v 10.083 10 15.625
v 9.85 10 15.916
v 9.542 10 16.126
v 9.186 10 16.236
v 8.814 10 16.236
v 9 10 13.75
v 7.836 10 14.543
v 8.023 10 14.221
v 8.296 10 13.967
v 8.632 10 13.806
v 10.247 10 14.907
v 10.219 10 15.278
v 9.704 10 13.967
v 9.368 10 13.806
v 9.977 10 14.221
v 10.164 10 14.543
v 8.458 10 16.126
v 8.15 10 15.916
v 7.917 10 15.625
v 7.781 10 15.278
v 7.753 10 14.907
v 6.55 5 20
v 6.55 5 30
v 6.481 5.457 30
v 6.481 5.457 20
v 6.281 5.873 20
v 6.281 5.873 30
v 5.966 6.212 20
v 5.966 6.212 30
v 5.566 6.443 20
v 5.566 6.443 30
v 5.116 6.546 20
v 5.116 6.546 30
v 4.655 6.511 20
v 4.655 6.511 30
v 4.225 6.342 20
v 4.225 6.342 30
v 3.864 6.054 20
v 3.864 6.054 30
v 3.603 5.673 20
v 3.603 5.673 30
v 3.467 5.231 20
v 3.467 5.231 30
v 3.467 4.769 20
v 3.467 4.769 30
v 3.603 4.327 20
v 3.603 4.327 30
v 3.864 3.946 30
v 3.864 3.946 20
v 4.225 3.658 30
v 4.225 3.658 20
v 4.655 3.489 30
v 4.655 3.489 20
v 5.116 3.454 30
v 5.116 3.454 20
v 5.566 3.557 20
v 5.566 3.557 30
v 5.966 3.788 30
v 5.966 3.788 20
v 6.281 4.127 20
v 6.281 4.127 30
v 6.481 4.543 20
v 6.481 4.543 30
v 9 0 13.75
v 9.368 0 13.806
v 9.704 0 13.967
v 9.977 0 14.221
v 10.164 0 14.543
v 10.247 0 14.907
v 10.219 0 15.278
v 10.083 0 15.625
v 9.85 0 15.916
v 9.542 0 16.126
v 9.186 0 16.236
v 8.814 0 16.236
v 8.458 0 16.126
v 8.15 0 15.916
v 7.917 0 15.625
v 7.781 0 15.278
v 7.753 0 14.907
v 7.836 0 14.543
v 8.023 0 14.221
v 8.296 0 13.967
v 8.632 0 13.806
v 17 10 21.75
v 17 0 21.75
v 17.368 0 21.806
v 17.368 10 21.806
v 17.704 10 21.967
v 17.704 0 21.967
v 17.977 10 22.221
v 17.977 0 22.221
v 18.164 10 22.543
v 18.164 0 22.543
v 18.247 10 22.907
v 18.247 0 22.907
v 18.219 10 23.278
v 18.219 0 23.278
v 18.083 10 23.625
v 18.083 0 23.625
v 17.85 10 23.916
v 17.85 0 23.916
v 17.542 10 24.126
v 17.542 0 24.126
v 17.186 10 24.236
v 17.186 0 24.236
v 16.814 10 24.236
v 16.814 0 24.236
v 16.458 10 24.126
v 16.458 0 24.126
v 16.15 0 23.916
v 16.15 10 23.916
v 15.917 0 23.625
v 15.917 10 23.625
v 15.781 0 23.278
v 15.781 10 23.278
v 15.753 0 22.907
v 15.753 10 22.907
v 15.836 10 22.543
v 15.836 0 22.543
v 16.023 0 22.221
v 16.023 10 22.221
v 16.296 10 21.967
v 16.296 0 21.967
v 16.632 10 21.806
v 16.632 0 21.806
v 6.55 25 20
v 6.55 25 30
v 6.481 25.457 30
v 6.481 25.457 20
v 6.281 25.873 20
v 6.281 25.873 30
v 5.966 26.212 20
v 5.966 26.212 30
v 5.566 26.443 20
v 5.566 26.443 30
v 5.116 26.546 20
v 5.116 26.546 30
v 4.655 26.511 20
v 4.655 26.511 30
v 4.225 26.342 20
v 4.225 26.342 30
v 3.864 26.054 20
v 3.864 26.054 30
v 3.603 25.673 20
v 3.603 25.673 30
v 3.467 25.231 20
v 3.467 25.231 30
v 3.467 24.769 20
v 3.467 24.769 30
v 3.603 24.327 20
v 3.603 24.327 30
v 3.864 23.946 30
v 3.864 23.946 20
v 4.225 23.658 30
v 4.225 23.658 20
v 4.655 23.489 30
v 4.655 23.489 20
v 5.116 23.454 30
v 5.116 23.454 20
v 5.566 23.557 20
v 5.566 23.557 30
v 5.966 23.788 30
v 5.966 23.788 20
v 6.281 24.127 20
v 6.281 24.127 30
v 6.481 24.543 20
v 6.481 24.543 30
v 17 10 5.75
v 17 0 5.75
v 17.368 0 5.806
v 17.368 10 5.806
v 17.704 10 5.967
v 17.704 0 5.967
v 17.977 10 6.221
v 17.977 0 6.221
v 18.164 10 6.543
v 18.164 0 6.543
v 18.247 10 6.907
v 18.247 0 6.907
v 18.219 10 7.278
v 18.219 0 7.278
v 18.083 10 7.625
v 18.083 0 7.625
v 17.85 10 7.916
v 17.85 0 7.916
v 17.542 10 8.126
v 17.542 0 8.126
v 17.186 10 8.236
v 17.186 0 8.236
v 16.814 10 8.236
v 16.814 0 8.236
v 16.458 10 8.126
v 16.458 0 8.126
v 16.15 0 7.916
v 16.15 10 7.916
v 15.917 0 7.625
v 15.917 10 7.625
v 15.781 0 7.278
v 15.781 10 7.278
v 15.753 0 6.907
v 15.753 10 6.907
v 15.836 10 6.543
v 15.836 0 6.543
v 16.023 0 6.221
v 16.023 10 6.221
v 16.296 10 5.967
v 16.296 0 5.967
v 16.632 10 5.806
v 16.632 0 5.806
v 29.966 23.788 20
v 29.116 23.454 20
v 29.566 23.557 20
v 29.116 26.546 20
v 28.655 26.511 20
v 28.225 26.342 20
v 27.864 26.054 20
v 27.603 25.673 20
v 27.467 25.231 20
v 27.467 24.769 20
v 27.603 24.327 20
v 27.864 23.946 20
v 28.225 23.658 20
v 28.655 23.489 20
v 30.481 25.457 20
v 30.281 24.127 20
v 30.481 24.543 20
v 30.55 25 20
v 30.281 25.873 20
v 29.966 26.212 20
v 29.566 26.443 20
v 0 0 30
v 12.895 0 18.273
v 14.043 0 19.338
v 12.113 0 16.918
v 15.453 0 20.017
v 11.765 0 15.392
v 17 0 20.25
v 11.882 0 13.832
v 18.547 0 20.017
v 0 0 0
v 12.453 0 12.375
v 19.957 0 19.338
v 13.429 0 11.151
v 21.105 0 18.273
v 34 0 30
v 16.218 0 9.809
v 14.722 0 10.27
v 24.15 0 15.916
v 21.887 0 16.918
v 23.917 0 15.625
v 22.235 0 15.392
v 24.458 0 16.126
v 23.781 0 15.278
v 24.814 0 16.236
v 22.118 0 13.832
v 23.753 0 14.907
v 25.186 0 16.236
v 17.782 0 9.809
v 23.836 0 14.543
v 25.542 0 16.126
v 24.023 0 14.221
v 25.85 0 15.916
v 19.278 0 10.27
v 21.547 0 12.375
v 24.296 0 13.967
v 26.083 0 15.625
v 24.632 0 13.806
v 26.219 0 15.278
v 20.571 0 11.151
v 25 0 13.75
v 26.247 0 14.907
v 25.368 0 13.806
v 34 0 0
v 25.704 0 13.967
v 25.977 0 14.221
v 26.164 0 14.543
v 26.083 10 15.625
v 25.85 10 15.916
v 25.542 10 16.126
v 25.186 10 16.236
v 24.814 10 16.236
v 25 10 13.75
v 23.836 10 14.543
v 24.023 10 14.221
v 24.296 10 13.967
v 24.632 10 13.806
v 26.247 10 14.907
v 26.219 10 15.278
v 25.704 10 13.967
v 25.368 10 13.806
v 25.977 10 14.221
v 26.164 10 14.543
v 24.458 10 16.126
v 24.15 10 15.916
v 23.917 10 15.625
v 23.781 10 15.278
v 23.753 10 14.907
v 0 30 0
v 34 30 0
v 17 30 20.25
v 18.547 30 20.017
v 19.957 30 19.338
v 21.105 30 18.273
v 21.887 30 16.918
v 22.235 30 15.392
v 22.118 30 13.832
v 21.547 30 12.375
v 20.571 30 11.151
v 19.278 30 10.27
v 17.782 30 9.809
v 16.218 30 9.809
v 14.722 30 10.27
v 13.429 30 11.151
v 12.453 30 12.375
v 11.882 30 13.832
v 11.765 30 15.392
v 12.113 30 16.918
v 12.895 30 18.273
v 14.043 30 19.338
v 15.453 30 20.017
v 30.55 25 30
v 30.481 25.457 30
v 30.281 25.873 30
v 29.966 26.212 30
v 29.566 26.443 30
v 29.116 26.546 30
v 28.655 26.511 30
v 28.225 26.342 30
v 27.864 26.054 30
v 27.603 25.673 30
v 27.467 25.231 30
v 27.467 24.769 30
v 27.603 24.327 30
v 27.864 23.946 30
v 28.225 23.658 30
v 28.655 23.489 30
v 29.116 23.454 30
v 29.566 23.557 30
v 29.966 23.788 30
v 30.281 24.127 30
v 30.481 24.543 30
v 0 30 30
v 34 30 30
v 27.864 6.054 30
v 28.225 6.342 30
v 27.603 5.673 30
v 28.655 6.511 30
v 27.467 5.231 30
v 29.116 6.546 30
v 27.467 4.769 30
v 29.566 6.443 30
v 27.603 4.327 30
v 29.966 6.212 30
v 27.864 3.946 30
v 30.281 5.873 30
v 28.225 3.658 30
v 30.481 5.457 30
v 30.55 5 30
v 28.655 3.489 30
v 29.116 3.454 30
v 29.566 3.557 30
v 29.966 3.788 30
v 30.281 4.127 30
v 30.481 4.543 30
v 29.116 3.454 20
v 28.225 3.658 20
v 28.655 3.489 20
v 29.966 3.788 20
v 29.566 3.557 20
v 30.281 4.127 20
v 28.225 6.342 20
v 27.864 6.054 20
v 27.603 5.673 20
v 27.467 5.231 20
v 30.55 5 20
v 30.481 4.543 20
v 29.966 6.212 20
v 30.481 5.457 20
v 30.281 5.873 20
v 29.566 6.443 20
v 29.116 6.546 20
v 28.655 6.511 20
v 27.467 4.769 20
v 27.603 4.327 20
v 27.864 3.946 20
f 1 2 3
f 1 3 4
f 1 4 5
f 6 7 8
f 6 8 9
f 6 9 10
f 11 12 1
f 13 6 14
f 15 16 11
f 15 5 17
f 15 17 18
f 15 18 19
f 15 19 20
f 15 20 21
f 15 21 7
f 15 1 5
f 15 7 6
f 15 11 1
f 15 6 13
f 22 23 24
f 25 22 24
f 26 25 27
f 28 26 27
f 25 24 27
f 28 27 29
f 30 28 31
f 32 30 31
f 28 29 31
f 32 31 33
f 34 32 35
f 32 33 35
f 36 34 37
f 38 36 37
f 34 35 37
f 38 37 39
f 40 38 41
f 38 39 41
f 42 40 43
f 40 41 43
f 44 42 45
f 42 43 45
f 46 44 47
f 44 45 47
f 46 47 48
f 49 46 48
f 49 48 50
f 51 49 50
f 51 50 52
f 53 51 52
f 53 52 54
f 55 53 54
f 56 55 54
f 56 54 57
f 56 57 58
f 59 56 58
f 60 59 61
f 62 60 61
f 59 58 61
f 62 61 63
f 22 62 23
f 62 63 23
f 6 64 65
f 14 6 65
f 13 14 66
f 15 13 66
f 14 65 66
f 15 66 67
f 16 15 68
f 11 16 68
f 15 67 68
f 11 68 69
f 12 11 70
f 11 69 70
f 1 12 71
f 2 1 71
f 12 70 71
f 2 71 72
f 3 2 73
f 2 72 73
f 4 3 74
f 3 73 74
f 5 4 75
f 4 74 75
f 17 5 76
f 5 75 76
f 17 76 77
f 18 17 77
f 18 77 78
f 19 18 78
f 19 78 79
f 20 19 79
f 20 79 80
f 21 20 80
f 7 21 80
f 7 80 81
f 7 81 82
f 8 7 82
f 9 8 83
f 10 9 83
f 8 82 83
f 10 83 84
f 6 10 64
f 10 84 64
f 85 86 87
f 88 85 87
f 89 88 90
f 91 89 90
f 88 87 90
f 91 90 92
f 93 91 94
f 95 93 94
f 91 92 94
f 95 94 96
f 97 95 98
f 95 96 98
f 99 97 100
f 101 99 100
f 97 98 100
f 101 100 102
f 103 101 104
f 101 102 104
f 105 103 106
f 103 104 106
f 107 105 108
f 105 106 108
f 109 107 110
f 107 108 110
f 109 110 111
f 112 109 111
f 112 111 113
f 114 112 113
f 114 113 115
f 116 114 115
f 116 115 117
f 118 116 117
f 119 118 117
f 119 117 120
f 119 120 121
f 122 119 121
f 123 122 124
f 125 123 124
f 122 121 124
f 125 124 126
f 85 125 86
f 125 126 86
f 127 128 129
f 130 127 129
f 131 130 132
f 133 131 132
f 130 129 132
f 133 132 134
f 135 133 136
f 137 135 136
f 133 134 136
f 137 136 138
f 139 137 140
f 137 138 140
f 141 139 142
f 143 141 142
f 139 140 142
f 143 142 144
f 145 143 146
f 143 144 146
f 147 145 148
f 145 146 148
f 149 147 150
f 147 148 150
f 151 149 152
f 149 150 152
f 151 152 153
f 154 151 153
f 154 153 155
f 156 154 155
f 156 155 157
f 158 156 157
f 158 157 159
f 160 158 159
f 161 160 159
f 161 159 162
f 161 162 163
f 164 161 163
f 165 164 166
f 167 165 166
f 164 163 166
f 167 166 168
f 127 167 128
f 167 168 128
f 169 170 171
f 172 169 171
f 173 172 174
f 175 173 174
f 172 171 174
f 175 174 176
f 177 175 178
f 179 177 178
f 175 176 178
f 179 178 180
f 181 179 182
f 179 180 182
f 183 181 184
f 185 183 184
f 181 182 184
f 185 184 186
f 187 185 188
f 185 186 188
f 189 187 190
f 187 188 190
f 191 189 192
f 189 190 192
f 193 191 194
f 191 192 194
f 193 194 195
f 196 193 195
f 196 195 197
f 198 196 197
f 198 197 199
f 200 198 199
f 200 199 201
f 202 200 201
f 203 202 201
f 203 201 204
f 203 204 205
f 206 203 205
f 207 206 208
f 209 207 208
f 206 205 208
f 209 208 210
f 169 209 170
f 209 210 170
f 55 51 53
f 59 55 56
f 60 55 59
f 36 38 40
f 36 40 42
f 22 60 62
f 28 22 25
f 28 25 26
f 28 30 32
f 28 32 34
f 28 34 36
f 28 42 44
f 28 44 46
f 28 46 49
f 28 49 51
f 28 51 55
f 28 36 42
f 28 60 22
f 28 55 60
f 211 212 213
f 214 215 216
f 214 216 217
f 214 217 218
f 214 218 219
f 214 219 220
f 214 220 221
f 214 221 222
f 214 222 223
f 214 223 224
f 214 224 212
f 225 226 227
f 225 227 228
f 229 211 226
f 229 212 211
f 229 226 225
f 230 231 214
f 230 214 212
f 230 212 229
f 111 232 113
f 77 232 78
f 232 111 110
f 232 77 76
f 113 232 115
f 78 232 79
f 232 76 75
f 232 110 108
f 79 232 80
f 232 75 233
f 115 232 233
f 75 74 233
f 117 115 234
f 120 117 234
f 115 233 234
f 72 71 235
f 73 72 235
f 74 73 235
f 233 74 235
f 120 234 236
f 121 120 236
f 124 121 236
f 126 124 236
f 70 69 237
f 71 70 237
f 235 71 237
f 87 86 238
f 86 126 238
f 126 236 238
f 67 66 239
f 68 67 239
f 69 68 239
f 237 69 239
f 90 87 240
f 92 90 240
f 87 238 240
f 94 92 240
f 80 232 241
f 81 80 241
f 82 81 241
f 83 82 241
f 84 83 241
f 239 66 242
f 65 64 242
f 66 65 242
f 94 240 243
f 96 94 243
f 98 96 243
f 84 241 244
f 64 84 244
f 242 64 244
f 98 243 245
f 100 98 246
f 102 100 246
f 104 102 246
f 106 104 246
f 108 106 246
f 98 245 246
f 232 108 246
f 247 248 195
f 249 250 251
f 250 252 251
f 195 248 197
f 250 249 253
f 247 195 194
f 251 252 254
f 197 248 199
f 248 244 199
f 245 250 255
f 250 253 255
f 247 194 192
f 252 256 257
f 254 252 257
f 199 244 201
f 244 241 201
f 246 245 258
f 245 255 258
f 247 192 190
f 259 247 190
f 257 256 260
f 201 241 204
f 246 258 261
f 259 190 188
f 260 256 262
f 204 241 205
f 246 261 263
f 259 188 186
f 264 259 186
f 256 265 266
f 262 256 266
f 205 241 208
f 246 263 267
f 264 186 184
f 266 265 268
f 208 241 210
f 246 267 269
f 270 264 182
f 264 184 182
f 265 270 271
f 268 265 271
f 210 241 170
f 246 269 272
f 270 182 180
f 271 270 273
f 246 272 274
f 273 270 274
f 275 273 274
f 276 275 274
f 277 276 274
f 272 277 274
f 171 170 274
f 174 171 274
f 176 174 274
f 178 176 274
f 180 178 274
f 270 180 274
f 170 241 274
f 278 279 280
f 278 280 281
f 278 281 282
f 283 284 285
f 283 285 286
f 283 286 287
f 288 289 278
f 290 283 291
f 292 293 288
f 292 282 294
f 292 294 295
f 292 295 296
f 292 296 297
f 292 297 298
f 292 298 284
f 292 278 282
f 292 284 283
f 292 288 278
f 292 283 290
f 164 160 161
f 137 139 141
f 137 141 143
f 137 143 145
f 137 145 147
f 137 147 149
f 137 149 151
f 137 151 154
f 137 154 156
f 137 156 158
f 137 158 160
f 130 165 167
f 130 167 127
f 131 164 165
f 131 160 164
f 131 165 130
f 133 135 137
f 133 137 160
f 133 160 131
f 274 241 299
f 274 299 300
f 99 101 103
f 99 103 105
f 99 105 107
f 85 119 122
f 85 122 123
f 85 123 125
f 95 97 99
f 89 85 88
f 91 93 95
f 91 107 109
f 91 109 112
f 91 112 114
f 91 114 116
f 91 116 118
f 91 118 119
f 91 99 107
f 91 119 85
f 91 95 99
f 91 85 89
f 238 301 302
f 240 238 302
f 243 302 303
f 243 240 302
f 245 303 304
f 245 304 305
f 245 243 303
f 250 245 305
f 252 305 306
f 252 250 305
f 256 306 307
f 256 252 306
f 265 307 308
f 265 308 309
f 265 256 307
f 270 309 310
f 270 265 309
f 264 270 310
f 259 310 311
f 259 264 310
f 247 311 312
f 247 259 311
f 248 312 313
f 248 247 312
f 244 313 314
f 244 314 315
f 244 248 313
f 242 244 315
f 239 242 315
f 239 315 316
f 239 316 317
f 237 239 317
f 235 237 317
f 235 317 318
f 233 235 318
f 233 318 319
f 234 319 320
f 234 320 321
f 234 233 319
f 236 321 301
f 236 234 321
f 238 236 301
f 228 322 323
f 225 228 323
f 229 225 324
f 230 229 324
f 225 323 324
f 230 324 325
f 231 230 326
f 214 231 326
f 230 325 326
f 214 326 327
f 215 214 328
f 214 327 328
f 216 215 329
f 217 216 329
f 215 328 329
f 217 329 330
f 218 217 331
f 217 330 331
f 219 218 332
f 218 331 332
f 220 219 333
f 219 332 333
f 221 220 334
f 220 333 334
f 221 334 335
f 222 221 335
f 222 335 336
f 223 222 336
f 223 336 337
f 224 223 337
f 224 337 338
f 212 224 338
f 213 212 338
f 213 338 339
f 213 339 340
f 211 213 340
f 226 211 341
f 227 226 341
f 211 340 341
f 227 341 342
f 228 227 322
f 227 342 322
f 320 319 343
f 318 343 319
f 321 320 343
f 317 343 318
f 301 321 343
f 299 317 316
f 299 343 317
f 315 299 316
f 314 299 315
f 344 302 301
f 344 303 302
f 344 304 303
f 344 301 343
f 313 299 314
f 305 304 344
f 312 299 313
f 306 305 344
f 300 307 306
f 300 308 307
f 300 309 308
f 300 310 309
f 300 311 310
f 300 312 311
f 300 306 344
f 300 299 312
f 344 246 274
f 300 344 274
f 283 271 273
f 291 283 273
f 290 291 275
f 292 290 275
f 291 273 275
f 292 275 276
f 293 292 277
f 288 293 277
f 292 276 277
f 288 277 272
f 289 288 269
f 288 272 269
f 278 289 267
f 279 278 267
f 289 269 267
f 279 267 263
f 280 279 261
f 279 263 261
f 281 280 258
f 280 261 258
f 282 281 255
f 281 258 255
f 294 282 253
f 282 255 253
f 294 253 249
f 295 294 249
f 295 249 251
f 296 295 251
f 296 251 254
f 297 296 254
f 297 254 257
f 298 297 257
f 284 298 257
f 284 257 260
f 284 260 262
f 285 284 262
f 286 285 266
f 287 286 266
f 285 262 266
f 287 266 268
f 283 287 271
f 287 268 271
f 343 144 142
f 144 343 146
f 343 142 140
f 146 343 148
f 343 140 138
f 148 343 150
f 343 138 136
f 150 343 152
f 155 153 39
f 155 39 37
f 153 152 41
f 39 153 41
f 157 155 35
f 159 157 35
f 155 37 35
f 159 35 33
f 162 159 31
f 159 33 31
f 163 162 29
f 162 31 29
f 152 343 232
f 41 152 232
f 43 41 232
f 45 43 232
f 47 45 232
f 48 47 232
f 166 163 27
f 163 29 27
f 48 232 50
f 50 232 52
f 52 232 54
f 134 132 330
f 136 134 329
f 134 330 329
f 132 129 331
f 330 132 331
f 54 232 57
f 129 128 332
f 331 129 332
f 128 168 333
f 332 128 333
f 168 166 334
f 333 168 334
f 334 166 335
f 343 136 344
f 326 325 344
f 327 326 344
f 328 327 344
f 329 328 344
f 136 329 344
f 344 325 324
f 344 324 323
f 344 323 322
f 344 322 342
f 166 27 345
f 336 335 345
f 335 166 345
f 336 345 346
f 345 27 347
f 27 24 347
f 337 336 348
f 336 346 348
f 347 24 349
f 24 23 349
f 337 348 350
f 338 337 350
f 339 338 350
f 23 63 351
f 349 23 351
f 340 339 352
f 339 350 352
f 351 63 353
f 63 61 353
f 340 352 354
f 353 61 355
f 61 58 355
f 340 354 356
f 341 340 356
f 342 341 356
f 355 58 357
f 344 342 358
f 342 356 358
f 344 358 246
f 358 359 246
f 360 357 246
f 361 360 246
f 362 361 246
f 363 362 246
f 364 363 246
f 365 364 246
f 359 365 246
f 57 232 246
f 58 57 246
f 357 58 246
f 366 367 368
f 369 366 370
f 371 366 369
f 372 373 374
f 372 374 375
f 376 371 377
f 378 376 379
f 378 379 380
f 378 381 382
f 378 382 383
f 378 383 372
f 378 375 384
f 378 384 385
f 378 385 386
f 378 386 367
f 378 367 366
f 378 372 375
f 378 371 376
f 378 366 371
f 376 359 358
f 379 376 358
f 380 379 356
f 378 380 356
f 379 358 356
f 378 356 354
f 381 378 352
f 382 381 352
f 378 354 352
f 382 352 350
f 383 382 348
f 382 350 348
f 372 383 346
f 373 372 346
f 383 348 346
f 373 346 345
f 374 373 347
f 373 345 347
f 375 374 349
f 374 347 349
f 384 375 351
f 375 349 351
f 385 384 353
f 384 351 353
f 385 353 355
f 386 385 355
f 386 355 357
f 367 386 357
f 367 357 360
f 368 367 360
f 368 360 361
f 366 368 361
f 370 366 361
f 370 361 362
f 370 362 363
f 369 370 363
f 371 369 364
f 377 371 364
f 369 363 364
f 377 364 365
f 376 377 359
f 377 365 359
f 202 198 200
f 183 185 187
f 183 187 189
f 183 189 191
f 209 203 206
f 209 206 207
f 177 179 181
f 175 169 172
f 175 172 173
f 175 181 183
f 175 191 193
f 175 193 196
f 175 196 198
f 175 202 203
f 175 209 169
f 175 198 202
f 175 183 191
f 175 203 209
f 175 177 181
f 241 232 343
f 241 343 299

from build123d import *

# Parameters (mm, degrees)
SKETCH1_W           = 34
SKETCH1_H           = 30
SKETCH1_R           = 5.25
BOSS_EXTRUDE1_DEPTH = 30
SKETCH2_R           = 1.25
CUT_EXTRUDE1_DEPTH  = 10
SKETCH3_R           = 1.55
CUT_EXTRUDE2_DEPTH  = 10


with BuildPart() as part:
    # Sketch1 → Boss-Extrude1 (new body)
    with BuildSketch(Plane(origin=(0, 0, 0), x_dir=(1, 0, 0), z_dir=(0, 1, 0))):
        with Locations((17, -15)):
            Rectangle(SKETCH1_W, SKETCH1_H)
        with Locations(Location((17, -15, 0), (0, 0, 270))):
            Circle(SKETCH1_R, mode=Mode.SUBTRACT)
    extrude(amount=BOSS_EXTRUDE1_DEPTH)

    # Sketch2 → Cut-Extrude1 (cut)
    with BuildSketch(Plane.XZ):
        with Locations(Location((17, 23, 0), (0, 0, 270))):
            Circle(SKETCH2_R)
        with Locations(Location((25, 15, 0), (0, 0, 270))):
            Circle(SKETCH2_R)
        with Locations(Location((17, 7, 0), (0, 0, 270))):
            Circle(SKETCH2_R)
        with Locations(Location((9, 15, 0), (0, 0, 270))):
            Circle(SKETCH2_R)
    extrude(amount=-CUT_EXTRUDE1_DEPTH, mode=Mode.SUBTRACT)

    # Sketch3 → Cut-Extrude2 (cut)
    with BuildSketch(Plane.XY.offset(30)):
        with Locations((5, 25)):
            Circle(SKETCH3_R)
        with Locations((29, 25)):
            Circle(SKETCH3_R)
        with Locations((29, 5)):
            Circle(SKETCH3_R)
        with Locations((5, 5)):
            Circle(SKETCH3_R)
    extrude(amount=-CUT_EXTRUDE2_DEPTH, mode=Mode.SUBTRACT)


solid = part.part
